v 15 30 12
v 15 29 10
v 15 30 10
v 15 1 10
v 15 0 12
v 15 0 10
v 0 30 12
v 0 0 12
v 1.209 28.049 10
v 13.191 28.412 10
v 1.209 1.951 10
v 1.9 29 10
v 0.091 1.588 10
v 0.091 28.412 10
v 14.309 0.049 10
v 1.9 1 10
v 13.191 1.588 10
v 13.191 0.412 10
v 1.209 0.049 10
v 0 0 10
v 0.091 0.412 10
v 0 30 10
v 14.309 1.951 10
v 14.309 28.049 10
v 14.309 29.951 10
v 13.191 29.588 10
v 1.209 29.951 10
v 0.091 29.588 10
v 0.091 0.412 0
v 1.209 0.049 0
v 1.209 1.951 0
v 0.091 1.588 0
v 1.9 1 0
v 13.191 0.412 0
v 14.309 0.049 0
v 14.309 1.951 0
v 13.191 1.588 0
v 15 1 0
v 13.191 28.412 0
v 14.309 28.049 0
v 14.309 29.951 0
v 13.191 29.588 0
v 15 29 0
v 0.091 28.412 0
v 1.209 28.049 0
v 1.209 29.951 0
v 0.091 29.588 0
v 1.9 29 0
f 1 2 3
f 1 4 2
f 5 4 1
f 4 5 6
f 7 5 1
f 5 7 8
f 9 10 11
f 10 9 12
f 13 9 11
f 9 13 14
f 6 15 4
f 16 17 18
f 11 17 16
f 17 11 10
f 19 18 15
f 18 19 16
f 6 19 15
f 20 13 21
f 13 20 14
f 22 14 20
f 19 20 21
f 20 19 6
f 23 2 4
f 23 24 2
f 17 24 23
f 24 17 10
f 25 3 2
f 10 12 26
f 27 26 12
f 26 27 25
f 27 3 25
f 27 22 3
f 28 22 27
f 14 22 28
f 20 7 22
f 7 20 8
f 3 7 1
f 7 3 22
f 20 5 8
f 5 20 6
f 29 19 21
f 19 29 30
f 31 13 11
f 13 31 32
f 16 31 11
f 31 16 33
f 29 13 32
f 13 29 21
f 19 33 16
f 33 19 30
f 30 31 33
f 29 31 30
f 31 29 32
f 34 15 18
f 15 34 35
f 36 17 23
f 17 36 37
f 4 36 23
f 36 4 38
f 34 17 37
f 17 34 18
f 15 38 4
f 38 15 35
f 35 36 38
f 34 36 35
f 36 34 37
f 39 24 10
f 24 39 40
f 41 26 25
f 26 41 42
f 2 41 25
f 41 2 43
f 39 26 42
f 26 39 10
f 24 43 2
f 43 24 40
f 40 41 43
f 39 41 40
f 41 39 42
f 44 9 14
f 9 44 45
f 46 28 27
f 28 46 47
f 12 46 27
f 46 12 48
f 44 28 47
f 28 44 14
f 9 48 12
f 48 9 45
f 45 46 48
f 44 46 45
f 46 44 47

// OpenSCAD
translate  ([0,0,10]) cube ([15,30,2]);
translate ([0.9,1,0])cylinder (10,1,1);
translate ([14,1,0])cylinder (10,1,1);
translate ([14,29,0])cylinder (10,1,1);
translate ([0.9,29,0])cylinder (10,1,1);
